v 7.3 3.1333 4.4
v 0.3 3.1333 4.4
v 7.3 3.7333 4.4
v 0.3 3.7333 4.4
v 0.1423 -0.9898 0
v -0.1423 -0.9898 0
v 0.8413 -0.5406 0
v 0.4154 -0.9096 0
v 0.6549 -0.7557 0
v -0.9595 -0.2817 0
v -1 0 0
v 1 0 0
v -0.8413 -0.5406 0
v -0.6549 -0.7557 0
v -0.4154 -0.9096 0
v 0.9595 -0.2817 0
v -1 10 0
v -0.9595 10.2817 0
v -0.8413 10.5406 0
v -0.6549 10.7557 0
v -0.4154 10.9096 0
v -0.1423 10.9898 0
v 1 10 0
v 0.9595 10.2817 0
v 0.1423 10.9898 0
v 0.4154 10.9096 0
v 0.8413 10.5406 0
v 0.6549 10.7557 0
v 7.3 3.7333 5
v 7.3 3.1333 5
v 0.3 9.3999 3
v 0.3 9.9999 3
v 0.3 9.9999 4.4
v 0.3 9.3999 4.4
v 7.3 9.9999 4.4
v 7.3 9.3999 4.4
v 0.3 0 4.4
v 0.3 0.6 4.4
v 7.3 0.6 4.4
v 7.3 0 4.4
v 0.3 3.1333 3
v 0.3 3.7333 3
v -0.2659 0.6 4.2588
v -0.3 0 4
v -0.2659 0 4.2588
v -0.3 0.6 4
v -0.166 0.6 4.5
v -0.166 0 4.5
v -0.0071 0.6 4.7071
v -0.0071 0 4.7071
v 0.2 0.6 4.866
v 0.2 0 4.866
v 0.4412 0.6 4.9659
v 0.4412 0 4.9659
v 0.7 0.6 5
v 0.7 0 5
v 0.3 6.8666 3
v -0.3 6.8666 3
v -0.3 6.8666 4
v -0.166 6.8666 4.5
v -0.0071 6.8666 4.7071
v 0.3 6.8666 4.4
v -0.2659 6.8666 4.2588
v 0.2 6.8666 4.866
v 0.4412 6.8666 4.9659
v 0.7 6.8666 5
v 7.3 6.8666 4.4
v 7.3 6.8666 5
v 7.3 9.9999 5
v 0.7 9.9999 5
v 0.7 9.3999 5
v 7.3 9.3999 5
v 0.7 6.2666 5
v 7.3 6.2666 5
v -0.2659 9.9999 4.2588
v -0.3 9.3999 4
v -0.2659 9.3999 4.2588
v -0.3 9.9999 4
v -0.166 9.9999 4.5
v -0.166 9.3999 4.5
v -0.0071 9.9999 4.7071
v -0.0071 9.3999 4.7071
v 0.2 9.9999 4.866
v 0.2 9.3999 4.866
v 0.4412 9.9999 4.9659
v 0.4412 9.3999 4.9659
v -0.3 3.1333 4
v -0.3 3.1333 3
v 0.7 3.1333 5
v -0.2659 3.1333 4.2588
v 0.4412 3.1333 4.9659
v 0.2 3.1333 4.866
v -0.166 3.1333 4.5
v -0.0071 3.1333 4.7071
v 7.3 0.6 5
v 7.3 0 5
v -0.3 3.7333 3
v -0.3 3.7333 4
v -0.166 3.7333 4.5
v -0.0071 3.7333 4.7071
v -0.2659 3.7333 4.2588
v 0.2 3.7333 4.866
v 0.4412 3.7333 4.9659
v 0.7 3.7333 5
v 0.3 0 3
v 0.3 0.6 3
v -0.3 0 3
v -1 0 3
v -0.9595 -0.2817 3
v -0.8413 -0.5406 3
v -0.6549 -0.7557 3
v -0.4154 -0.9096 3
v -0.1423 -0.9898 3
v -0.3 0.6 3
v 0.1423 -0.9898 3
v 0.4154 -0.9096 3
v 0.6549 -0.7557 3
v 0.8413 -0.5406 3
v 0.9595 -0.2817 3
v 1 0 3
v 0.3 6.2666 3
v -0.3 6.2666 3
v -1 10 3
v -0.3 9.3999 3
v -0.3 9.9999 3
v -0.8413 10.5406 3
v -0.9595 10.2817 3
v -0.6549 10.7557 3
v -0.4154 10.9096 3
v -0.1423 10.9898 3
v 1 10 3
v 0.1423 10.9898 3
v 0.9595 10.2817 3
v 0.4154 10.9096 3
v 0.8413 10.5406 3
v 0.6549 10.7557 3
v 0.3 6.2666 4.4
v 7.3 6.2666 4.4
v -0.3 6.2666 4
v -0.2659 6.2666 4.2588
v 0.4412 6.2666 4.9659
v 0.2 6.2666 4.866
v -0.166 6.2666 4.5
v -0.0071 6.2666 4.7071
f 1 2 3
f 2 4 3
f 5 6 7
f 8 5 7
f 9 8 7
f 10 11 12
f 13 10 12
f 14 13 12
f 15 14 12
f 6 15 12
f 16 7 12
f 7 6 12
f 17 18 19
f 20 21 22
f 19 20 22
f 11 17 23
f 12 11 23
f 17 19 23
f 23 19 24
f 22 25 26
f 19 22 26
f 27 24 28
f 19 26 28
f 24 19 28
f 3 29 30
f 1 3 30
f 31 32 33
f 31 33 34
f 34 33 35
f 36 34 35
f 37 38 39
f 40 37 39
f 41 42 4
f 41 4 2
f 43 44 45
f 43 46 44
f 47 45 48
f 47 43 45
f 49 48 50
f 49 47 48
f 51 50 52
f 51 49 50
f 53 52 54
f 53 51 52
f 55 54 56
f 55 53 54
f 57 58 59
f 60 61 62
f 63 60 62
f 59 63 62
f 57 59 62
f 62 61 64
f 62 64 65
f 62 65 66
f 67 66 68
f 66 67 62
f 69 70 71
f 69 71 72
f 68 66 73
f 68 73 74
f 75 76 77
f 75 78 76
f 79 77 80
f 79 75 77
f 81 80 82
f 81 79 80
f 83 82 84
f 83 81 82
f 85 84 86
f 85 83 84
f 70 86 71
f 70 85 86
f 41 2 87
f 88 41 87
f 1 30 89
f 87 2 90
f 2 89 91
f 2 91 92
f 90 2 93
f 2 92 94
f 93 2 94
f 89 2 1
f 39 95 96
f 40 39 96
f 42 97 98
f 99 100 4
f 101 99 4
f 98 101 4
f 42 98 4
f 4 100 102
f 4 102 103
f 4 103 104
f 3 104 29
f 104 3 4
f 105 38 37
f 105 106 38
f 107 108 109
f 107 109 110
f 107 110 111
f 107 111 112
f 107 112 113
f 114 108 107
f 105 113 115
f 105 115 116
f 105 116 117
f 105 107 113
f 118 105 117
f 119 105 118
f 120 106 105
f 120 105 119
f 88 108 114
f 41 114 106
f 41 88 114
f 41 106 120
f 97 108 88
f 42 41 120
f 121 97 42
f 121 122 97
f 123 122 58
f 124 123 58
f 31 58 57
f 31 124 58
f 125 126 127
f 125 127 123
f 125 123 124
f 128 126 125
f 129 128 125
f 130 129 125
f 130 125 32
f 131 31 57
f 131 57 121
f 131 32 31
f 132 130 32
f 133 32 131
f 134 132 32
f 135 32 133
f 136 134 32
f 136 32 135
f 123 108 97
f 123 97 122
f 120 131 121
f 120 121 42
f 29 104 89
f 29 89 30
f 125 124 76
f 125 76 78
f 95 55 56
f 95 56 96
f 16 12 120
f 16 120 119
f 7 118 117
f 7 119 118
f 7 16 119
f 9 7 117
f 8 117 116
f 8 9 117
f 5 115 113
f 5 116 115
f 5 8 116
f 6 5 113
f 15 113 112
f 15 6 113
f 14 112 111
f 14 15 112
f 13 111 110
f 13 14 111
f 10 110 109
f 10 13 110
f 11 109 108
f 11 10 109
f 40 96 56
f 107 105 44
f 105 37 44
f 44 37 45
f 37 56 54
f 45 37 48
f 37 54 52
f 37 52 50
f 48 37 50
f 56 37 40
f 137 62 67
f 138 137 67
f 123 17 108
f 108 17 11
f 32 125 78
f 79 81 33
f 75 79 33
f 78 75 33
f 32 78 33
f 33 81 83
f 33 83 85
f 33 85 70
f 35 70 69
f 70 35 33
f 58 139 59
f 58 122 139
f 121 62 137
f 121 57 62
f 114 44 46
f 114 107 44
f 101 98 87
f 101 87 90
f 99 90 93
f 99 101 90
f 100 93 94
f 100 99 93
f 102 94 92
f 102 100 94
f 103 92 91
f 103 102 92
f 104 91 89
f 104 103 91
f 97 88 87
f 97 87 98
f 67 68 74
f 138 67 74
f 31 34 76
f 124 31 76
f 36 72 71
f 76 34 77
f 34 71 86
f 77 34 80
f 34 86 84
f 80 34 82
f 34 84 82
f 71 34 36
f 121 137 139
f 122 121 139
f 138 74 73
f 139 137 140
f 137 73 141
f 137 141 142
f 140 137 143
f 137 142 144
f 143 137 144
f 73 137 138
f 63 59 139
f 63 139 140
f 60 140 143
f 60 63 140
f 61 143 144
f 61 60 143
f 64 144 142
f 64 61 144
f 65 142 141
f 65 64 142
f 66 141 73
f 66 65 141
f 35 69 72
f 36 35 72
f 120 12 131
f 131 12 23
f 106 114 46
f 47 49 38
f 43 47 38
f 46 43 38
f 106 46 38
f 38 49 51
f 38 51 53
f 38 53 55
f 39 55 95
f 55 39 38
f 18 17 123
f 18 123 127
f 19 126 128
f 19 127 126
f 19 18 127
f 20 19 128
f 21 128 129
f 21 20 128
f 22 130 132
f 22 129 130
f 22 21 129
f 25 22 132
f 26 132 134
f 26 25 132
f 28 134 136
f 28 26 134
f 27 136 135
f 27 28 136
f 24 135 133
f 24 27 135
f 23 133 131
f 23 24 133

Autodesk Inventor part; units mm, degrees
ref_plane "YZ Plane" through (0, 0, 0) normal (1, 0, 0) x (0, 1, 0)
ref_plane "XZ Plane" through (0, 0, 0) normal (0, 1, 0) x (-1, 0, 0)
ref_plane "XY Plane" through (0, 0, 0) normal (0, 0, 1) x (1, 0, 0)
sketch "Esboço1" plane through (0, 0, 0) normal (0, 0, 1) x (1, 0, 0)
  line L0 (0, 0) -> (0, 10) construction
  line L1 (1, 0) -> (1, 10)
  line L2 (-1, 10) -> (-1, 0)
  arc A0 (-1, 0) -> (1, 0) centre (0, 0) ccw
  arc A1 (1, 10) -> (-1, 10) centre (0, 10) ccw
  point P0 (0, 5)
  dimension "d0" = 10
  dimension "d1" = 2
extrude "Extrusão1" add sketch "Esboço1" along normal blind 3
sketch "Esboço2" plane through (0, 0, 3) normal (0, 0, 1) x (1, 0, 0)
  arc A0 (1, 10) -> (-1, 10) centre (0, 10) ccw construction
  arc A1 (-1, 0) -> (1, 0) centre (0, 0) ccw construction
  line L0 (0, 10) -> (0, 0) construction
  line L1 (-1, 10) -> (-1, 0) construction
  line L2 (-1, 0) -> (1, 0) construction
  line L3 (0.3, 0) -> (-0.3, 0)
  line L4 (-0.3, 0) -> (-0.3, 0.6)
  line L5 (-0.3, 0.6) -> (0.3, 0.6)
  line L6 (0.3, 0.6) -> (0.3, 0)
  dimension "d4" = 0.6
  dimension "d5" = 0.6
  dimension "d6" = 0.6
  dimension "d7" = 0.3
extrude "Extrusão2" add sketch "Esboço2" along normal blind 2
sketch "Esboço3" plane through (0, 0, 5) normal (0, 0, 1) x (1, 0, 0)
  line L0 (0.3, 0) -> (-0.3, 0) projected
  line L1 (-0.3, 0.6) -> (0.3, 0.6) projected
  line L2 (0.3, 0.6) -> (0.3, 0)
  line L3 (0.3, 0.6) -> (0.3, 0) projected
  line L4 (0.3, 0.6) -> (7.3, 0.6)
  line L5 (7.3, 0.6) -> (7.3, 0)
  line L6 (7.3, 0) -> (0.3, 0)
  line L7 (0.3, 0) -> (0.3, 0.6)
  point P0 (0, 0)
  dimension "d13" = 7
extrude "Extrusão3" add sketch "Esboço3" against normal blind 0.6
fillet "Arredondamento1" radius 1 1 edges at (-0.3, 0.3, 5)
pattern_linear "Padrão retangular1" count 4 spacing 3.1333 along (0, 1, 0) of "Extrusão3", "Arredondamento1", "Extrusão2"
properties part number "Conector"
